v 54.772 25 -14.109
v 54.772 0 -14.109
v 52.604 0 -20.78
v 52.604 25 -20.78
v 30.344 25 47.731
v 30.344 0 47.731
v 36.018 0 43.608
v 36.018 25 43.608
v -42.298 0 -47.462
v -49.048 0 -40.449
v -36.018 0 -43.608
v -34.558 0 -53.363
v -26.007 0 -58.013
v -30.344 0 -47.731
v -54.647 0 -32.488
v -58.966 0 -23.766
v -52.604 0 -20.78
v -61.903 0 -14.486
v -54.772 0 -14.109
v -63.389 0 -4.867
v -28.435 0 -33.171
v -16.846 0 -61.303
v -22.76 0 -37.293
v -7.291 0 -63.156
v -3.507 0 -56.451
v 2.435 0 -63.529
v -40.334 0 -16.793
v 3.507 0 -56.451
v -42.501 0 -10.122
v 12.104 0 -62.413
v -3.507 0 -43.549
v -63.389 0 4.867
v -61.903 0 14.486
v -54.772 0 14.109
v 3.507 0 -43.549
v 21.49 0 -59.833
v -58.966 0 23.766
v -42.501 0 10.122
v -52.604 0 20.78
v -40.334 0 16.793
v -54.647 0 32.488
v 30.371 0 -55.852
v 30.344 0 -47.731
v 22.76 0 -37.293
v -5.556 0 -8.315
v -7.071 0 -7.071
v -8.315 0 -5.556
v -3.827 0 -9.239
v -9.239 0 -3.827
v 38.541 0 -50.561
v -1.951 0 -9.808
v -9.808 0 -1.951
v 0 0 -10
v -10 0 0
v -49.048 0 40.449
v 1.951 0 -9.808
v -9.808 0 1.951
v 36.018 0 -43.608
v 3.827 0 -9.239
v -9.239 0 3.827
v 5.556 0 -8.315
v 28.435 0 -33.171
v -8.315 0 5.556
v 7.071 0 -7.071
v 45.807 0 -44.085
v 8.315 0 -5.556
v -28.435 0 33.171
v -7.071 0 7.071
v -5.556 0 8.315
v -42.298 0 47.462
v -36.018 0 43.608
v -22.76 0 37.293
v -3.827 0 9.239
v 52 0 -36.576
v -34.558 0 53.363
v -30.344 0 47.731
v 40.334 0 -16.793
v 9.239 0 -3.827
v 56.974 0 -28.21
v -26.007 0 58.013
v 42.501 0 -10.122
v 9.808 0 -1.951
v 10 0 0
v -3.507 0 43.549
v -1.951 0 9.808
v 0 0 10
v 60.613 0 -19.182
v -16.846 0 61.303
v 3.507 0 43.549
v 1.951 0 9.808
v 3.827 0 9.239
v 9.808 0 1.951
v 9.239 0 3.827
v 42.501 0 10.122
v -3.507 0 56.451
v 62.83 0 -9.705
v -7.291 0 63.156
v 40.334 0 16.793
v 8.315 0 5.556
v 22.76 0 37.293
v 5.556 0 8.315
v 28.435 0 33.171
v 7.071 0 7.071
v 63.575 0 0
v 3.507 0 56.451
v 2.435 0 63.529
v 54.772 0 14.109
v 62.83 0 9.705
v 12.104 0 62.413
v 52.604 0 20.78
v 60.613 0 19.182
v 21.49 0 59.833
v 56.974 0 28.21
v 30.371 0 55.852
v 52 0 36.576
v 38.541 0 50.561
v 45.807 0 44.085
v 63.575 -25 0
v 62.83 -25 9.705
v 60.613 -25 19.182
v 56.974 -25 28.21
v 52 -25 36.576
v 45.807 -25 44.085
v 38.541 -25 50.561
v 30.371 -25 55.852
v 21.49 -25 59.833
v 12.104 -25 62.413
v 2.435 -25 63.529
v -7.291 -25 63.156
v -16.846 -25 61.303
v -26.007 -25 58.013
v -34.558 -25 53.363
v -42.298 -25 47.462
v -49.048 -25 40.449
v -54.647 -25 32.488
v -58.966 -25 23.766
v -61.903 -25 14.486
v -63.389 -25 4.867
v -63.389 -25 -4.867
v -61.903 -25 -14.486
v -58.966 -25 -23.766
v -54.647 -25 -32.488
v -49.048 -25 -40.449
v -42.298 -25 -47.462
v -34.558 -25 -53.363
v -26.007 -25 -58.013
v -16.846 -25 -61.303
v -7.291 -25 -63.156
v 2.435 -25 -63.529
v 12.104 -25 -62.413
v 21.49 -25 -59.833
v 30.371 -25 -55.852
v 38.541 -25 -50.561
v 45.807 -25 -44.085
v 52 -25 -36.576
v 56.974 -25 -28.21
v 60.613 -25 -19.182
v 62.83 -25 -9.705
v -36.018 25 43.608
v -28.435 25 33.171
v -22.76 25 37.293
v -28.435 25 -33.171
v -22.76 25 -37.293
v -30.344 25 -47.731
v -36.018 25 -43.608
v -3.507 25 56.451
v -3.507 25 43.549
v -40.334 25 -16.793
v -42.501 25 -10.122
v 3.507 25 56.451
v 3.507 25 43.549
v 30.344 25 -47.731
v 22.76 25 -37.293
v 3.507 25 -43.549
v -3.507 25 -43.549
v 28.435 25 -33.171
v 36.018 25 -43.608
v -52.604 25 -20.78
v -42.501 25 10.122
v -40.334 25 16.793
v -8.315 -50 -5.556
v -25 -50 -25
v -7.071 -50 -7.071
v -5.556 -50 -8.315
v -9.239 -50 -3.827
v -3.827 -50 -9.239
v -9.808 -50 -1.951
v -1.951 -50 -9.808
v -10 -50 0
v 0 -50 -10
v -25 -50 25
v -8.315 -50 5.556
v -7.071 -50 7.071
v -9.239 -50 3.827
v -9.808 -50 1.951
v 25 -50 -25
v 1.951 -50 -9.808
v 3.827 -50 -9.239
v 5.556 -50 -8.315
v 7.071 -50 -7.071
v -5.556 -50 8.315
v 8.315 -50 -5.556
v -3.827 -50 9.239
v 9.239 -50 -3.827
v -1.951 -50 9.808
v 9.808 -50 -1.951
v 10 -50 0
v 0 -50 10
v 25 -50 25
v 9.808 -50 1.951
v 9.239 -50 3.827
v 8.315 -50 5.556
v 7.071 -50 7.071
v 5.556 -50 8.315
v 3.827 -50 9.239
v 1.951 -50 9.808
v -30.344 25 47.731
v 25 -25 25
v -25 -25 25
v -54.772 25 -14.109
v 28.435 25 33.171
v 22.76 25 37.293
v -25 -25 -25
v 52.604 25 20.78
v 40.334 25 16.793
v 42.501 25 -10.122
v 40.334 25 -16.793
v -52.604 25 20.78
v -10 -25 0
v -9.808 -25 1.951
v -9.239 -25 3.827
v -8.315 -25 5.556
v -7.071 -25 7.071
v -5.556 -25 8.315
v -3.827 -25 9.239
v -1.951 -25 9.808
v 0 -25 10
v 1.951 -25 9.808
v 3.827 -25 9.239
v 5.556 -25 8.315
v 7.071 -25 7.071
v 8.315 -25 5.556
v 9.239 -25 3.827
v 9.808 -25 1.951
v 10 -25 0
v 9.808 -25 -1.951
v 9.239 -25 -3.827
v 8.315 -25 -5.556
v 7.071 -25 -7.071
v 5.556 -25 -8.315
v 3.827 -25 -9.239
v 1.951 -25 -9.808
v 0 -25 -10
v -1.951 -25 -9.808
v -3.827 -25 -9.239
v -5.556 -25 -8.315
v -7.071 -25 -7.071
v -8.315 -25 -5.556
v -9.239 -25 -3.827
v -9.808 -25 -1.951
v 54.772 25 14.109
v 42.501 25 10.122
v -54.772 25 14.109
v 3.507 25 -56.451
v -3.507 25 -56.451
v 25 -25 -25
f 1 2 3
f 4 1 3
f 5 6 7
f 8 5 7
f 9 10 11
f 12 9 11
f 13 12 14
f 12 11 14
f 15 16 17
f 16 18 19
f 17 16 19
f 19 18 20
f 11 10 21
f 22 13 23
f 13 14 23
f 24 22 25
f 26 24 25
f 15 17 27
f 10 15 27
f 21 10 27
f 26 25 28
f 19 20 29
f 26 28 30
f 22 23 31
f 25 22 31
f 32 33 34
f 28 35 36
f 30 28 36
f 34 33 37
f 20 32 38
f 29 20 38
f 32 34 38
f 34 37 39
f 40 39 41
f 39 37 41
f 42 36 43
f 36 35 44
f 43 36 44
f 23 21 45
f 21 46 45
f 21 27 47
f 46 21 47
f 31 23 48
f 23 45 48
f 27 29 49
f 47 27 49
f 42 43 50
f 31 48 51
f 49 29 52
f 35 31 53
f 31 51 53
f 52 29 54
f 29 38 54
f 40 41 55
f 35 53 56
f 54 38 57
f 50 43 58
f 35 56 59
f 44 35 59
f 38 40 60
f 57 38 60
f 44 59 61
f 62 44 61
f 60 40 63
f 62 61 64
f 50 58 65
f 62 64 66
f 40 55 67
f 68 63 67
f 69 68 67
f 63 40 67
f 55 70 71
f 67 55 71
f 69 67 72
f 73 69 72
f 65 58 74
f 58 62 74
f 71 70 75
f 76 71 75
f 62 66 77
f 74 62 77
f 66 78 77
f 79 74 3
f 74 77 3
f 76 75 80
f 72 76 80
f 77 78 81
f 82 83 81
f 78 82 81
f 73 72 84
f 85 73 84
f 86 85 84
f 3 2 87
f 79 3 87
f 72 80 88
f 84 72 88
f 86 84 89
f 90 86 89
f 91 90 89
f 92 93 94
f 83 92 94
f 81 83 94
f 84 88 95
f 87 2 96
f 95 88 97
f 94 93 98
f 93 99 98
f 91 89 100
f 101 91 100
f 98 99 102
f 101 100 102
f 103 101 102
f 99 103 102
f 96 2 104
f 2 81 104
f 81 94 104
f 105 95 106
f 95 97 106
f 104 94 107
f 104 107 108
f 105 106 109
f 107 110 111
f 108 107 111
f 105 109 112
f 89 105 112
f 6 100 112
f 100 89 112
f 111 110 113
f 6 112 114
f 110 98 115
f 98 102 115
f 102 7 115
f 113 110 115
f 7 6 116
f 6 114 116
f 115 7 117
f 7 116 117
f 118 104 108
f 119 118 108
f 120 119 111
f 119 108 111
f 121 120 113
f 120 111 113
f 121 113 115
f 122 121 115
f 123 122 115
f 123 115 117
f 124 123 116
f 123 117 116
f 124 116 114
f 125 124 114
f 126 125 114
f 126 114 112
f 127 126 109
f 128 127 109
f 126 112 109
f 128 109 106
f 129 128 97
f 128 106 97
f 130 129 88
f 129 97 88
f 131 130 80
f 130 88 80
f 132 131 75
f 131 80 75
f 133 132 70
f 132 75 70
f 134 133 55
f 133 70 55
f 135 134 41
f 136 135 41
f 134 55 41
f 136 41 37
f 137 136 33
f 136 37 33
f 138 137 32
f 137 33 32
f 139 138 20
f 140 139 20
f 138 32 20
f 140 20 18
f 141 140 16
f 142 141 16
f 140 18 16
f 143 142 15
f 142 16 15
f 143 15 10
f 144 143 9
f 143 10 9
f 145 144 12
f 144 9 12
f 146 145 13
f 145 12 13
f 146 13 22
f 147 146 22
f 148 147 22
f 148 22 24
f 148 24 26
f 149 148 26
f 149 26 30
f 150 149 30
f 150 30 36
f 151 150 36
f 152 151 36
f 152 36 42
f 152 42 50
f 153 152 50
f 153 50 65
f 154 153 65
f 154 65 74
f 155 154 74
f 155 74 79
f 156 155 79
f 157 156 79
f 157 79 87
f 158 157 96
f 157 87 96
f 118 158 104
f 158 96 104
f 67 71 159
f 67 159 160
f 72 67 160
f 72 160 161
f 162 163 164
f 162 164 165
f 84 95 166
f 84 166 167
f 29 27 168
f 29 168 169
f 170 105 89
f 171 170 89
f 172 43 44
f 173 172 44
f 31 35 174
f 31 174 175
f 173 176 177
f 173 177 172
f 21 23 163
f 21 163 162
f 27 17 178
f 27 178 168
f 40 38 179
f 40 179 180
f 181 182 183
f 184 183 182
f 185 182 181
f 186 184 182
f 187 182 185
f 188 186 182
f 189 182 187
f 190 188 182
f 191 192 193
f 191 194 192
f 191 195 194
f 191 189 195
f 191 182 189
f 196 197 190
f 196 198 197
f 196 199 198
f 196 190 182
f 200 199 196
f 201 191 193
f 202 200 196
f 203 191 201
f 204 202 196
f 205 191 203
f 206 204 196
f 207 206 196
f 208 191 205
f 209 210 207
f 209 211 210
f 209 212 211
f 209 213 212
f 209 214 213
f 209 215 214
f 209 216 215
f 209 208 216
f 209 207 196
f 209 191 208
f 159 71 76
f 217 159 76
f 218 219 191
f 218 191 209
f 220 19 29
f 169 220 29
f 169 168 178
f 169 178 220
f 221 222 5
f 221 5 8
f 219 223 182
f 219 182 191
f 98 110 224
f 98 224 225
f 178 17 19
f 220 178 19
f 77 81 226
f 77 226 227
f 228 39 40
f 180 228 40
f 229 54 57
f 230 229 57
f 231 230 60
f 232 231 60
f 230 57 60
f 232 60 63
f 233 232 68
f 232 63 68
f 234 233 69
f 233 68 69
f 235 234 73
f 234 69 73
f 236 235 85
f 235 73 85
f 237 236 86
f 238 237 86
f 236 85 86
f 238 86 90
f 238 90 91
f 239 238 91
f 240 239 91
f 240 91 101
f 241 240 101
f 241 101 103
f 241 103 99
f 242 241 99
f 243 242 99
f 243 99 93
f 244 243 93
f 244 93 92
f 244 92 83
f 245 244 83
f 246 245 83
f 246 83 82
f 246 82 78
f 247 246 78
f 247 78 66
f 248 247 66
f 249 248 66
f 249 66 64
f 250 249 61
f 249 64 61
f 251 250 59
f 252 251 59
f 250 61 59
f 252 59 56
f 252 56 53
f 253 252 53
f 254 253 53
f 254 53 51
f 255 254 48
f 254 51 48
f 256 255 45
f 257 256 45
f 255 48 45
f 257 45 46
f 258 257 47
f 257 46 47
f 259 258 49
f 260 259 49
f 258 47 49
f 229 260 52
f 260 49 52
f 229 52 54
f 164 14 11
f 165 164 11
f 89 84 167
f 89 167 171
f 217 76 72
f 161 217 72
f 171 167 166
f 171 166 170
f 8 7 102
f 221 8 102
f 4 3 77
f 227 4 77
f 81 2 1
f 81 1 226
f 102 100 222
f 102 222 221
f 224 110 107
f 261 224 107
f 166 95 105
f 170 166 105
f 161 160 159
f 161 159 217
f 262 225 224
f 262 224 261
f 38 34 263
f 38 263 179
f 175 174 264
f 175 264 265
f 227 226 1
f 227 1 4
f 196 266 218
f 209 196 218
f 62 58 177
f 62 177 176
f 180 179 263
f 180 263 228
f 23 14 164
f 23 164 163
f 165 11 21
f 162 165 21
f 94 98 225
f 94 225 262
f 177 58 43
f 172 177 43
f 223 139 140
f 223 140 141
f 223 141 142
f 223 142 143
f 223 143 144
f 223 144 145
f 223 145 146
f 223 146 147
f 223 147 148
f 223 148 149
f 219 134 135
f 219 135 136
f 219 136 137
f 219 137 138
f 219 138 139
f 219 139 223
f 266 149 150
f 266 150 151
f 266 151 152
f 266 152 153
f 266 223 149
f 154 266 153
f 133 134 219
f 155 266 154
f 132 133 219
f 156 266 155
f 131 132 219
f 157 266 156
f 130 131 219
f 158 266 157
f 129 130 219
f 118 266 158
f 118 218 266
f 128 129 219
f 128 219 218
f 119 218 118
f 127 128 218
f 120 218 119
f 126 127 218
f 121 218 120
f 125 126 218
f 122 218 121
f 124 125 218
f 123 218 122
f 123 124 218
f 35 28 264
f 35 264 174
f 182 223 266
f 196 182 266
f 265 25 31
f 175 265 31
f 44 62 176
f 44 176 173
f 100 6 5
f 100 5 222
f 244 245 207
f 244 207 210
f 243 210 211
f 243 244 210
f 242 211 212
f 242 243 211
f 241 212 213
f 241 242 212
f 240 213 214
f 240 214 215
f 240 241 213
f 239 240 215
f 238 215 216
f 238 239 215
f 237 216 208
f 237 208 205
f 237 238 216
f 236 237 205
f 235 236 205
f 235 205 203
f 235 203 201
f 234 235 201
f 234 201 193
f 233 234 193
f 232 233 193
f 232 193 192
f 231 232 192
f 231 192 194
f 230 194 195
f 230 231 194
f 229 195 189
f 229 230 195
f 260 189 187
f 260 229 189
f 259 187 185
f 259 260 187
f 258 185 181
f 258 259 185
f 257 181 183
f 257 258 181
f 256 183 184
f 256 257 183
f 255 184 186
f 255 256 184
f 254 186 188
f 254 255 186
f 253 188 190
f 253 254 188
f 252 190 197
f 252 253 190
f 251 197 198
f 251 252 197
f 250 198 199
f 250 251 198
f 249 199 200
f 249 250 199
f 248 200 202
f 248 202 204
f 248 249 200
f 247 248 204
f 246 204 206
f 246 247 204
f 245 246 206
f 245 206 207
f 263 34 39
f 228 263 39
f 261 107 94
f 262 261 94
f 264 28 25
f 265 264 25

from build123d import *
from build123d import SkipClean  # not in build123d's __all__

# Parameters (mm, degrees)
F0_R     = 63.5754098613
F1_DEPTH = 25
F2_R     = 10
F3_DEPTH = 25.001
F4_W     = 50
F4_H     = 50
F4_R     = 10
F5_DEPTH = 25
F6_W     = 7.0136869326
F6_H     = 12.901866436
F7_DEPTH = 25
F8_COUNT = 10


# Not quite as in the source:
# - after a boolean that leaves OpenCascade's solid faulty, fix() repairs it


with BuildPart() as f1:
    # F0 (on Front) → F1 (new body)
    with BuildSketch(Plane.XZ):
        Circle(F0_R)
    extrude(amount=F1_DEPTH)

    # F2 (on face) → F3 (cut, through all)
    with BuildSketch(Plane(origin=(0, 0, 0), x_dir=(-1, 0, 0), z_dir=(0, 1, 0))):
        Circle(F2_R)
    extrude(amount=-F3_DEPTH, mode=Mode.SUBTRACT)

    # F4 (on face) → F5 (join)
    with BuildSketch(Plane.XZ.offset(25)):
        Rectangle(F4_W, F4_H)
        Circle(F4_R, mode=Mode.SUBTRACT)
    with SkipClean():  # cleaning this boolean's faces spoils the solid; the shape is the same uncleaned
        extrude(amount=F5_DEPTH)

    # F6 (on face) → F7 (join)
    with BuildSketch(Plane(origin=(0, 0, 0), x_dir=(-1, 0, 0), z_dir=(0, 1, 0))):
        with Locations((0, -50)):
            Rectangle(F6_W, F6_H)
    f7 = extrude(amount=F7_DEPTH)

    add(f1.part.fix(), mode=Mode.REPLACE)

    # F8: F7 ×10 about axis
    f8_axis = Axis((0, 0, 0), (0, -1, 0))
    for i in range(1, F8_COUNT):
        add(f7.rotate(f8_axis, i * 360 / F8_COUNT), clean=False)


solid = f1.part
